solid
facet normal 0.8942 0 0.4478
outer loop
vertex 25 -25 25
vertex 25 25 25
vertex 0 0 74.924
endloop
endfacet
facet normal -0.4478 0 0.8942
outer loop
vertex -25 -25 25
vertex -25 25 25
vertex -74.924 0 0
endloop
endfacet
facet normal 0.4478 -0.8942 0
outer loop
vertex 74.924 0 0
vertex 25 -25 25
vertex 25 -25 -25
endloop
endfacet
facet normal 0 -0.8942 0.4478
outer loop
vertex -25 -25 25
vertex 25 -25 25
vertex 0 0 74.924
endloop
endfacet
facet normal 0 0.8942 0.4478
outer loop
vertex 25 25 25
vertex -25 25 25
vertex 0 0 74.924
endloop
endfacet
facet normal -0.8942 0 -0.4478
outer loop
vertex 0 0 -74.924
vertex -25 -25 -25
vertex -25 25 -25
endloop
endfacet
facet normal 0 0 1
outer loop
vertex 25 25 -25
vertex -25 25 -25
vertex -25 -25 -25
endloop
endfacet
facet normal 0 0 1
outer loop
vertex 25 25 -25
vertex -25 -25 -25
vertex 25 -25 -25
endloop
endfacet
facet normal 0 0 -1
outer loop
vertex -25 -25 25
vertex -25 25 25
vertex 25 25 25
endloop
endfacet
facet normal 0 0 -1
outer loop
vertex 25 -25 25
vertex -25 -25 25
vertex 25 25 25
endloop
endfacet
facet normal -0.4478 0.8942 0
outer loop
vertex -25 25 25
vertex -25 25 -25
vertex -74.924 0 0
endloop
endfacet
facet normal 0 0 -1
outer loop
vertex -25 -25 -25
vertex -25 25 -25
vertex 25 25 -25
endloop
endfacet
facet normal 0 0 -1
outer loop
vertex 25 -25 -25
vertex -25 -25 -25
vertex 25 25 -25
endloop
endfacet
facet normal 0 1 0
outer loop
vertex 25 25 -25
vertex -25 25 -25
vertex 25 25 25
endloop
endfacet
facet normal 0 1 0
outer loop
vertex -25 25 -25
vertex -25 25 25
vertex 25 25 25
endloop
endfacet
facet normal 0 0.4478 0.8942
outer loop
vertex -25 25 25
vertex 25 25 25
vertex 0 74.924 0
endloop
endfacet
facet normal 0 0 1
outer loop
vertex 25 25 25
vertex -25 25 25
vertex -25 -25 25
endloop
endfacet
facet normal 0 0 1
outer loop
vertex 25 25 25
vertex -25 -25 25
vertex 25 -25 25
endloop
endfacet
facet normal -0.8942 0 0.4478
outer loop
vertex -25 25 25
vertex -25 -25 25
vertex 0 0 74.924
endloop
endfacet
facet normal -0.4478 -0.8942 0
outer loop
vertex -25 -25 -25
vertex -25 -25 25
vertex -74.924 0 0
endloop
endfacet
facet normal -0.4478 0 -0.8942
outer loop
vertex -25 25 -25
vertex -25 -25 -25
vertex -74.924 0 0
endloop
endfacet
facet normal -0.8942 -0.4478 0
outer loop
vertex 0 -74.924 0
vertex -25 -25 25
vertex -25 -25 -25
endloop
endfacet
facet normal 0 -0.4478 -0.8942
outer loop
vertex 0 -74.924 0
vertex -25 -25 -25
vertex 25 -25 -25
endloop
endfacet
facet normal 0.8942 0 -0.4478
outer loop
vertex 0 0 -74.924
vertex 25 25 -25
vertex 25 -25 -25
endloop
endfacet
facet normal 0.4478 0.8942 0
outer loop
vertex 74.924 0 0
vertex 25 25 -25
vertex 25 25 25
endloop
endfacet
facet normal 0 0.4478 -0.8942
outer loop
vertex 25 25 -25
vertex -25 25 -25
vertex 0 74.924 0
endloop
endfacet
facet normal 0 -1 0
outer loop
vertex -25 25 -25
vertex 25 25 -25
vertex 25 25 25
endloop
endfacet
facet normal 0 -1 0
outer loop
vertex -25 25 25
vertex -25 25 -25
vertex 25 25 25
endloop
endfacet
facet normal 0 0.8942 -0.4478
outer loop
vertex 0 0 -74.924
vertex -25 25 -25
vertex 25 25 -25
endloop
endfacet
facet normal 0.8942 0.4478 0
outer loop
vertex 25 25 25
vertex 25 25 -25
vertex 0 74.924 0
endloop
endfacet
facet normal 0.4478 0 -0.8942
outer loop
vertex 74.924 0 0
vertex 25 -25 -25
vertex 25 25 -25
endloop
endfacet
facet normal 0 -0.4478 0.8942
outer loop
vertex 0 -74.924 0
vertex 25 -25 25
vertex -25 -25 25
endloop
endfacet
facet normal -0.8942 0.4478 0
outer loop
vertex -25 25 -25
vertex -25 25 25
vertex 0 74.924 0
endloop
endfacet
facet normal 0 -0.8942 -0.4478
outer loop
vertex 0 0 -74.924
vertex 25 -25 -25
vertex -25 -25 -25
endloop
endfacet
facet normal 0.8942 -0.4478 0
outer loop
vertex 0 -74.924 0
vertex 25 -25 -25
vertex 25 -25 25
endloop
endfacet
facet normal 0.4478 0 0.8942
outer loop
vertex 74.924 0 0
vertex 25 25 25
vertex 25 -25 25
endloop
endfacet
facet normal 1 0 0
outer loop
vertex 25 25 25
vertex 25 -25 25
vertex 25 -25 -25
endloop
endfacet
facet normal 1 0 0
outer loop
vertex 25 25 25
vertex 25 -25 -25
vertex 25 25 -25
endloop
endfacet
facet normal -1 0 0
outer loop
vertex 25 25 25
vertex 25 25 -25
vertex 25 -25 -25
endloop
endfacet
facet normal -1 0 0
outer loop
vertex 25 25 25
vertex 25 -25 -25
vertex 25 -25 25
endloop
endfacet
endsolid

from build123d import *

# Parameters (mm, degrees)
F0_W     = 50
F0_H     = 50
F1_DEPTH = 25
F2_W     = 50
F2_H     = 50
F3_DEPTH = 50
F3_TAPER = 26.6


with BuildPart() as f1:
    # F0 (on Top) → F1 (new body, symmetric)
    with BuildSketch(Plane.XY):
        Rectangle(F0_W, F0_H)
    extrude(amount=F1_DEPTH, both=True)



with BuildPart() as f3:
    # F2 (on face) → F3 (new body)
    with BuildSketch(Plane.XY.offset(25)):
        Rectangle(F2_W, F2_H)
    extrude(amount=F3_DEPTH, taper=F3_TAPER)


with BuildPart() as f4_1:
    # F4: instance of F3
    add(f3.part.mirror(Plane.XY))


with BuildPart() as f6_1:
    # F6: instance of F3
    add(f3.part.mirror(Plane(origin=(25, -25, 25), x_dir=(-0.5773502692, 0.5773502692, -0.5773502692), z_dir=(0.7071067812, 0, -0.7071067812))))


with BuildPart() as f7_1:
    # F7: instance of F4_1
    add(f4_1.part.mirror(Plane(origin=(25, -25, 25), x_dir=(-0.5773502692, 0.5773502692, -0.5773502692), z_dir=(0.7071067812, 0, -0.7071067812))))


with BuildPart() as f9_1:
    # F9: instance of F6_1
    add(f6_1.part.mirror(Plane(origin=(25, 25, 25), x_dir=(-0.5773502692, -0.5773502692, -0.5773502692), z_dir=(0.7071067812, -0.7071067812, 0))))


with BuildPart() as f1_1:
    add(f1.part)

    add(f7_1.part)  # F10 merges F7_1
    # F10: F7_1 across plane
    add(f7_1.part.mirror(Plane(origin=(25, 25, 25), x_dir=(-0.5773502692, -0.5773502692, -0.5773502692), z_dir=(0.7071067812, -0.7071067812, 0))))


solid = Compound([f3.part, f4_1.part, f6_1.part, f9_1.part, f1_1.part])
